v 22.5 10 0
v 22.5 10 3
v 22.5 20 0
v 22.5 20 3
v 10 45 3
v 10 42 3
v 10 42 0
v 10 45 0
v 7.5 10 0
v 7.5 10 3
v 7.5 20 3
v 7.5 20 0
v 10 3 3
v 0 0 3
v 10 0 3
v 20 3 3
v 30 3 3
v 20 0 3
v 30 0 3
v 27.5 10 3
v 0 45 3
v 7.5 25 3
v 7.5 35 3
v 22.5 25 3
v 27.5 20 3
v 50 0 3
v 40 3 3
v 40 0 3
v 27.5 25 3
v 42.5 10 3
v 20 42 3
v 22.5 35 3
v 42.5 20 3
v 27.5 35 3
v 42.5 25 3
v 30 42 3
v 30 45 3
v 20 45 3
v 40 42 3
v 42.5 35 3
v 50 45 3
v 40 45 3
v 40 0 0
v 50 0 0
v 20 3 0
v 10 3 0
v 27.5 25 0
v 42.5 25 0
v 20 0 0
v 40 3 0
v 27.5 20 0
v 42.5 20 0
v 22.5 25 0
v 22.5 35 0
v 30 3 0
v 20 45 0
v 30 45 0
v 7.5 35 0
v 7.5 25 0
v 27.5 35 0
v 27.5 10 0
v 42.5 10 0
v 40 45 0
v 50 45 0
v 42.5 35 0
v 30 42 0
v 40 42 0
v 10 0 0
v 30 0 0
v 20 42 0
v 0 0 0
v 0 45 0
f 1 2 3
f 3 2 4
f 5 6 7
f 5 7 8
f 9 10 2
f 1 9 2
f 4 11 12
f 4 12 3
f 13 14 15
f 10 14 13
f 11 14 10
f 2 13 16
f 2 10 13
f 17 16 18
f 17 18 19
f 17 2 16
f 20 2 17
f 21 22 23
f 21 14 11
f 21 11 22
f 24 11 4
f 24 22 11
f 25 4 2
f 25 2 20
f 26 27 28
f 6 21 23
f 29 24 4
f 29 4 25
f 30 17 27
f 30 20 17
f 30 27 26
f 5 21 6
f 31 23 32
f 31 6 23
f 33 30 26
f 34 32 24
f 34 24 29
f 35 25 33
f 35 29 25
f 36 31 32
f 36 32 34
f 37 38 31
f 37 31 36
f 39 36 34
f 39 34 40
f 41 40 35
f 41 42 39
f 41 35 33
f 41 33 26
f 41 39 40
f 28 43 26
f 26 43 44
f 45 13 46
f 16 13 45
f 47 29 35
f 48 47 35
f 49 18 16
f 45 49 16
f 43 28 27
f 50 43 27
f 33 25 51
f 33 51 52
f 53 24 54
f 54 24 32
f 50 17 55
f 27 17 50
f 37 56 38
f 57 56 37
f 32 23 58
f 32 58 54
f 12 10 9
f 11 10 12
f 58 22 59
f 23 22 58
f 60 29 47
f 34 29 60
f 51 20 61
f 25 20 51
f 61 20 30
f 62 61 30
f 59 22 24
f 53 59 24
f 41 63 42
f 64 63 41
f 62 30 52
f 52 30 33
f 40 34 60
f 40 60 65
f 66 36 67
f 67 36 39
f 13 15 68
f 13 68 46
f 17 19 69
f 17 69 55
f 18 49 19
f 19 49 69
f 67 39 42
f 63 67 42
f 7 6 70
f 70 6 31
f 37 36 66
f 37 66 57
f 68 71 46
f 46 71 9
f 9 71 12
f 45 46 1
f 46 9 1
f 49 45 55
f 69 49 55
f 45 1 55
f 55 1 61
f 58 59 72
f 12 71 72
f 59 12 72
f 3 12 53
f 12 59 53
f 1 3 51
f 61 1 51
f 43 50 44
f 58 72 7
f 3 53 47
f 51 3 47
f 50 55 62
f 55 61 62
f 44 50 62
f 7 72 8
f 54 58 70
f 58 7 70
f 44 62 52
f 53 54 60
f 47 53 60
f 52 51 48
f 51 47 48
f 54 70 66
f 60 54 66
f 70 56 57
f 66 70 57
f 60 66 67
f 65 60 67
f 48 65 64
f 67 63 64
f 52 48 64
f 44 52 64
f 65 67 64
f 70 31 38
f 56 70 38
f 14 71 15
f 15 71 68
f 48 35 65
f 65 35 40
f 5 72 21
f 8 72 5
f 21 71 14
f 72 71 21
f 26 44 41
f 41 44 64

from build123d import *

# Parameters (mm, degrees)
ESQUISSE1_W             = 50
ESQUISSE1_H             = 45
BOSS_EXTRU_1_DEPTH      = 3
ESQUISSE2_W             = 10
ESQUISSE2_H             = 3
ENL_V_MAT_EXTRU_1_DEPTH = 10
ESQUISSE3_W             = 15
ESQUISSE3_H             = 10
ENL_V_MAT_EXTRU_2_DEPTH = 10
ESQUISSE4_W             = 10
ESQUISSE4_H             = 3
ENL_V_MAT_EXTRU_3_DEPTH = 10


with BuildPart() as part:
    # Esquisse1 → Boss.-Extru.1 (new body)
    with BuildSketch(Plane.XY):
        with Locations((25, 22.5)):
            Rectangle(ESQUISSE1_W, ESQUISSE1_H)
    extrude(amount=BOSS_EXTRU_1_DEPTH)

    # Esquisse2 → Enlèv. mat.-Extru.1 (cut)
    with BuildSketch(Plane.XY.offset(3)):
        with Locations((15, 1.5)):
            Rectangle(ESQUISSE2_W, ESQUISSE2_H)
        with Locations((35, 1.5)):
            Rectangle(ESQUISSE2_W, ESQUISSE2_H)
    extrude(amount=-ENL_V_MAT_EXTRU_1_DEPTH, mode=Mode.SUBTRACT)

    # Esquisse3 → Enlèv. mat.-Extru.2 (cut)
    with BuildSketch(Plane.XY.offset(3)):
        with Locations((35, 30)):
            Rectangle(ESQUISSE3_W, ESQUISSE3_H)
        with Locations((15, 30)):
            Rectangle(ESQUISSE3_W, ESQUISSE3_H)
        with Locations((35, 15)):
            Rectangle(ESQUISSE3_W, ESQUISSE3_H)
        with Locations((15, 15)):
            Rectangle(ESQUISSE3_W, ESQUISSE3_H)
    extrude(amount=-ENL_V_MAT_EXTRU_2_DEPTH, mode=Mode.SUBTRACT)

    # Esquisse4 → Enlèv. mat.-Extru.3 (cut)
    with BuildSketch(Plane.XY.offset(3)):
        with Locations((15, 43.5)):
            Rectangle(ESQUISSE4_W, ESQUISSE4_H)
        with Locations((35, 43.5)):
            Rectangle(ESQUISSE4_W, ESQUISSE4_H)
    extrude(amount=-ENL_V_MAT_EXTRU_3_DEPTH, mode=Mode.SUBTRACT)


solid = part.part
